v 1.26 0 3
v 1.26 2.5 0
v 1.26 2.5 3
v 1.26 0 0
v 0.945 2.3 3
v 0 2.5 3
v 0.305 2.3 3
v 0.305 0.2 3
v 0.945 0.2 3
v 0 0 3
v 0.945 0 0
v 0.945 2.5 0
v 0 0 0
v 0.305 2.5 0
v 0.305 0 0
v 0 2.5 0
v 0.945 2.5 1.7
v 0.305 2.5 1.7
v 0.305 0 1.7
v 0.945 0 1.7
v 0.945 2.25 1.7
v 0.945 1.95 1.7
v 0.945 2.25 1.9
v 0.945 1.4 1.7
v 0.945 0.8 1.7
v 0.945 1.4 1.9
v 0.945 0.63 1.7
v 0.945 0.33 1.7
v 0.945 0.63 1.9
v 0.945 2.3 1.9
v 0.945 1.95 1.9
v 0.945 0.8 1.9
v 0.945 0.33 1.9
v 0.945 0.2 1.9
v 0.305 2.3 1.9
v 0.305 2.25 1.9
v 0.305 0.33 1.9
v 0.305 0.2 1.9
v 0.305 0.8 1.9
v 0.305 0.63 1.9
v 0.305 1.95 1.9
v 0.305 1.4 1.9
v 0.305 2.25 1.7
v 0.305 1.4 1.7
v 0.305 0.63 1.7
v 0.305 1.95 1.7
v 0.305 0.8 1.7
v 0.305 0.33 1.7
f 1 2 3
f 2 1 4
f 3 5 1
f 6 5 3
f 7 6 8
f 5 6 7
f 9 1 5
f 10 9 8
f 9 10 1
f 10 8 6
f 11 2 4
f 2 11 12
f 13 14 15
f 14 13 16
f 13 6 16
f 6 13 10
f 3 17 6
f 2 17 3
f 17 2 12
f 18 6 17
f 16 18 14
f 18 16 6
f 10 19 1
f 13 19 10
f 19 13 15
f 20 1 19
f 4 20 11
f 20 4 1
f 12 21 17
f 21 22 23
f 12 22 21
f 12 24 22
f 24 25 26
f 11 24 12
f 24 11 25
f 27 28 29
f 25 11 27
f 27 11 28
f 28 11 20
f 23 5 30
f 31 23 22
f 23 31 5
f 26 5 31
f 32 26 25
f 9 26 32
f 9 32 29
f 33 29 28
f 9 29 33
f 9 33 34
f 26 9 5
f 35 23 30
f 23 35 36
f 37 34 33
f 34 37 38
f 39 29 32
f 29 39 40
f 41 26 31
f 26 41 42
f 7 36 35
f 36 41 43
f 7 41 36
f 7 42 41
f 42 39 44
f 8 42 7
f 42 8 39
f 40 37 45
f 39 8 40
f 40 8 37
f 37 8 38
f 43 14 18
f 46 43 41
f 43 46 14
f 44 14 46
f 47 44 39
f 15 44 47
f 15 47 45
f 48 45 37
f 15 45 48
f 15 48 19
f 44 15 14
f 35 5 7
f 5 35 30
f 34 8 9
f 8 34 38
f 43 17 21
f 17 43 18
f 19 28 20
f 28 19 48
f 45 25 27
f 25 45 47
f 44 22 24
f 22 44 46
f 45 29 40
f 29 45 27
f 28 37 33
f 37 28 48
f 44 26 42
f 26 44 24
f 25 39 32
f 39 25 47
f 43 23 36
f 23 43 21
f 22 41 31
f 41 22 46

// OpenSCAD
difference () {
    
    cube([1.26, 2.5, 3]); 
    
    translate ([0.305,0.2,1.9]) {
        cube([0.64, 2.1, 1.2]);
    }
    translate ([0.305,-0.3,-0.2]) 
    {
        cube([0.64, 3, 1.9]);
    }
    
    translate ([0.305,0.33,0]) 
    {
        cube([0.64, 0.3, 3]);
    }
    translate ([0.305,0.8,0]) 
    {
        cube([0.64, 0.6, 3]);
    }
    translate ([0.305,1.95,0]) 
    {
        cube([0.64, 0.3, 3]);
    }
}
